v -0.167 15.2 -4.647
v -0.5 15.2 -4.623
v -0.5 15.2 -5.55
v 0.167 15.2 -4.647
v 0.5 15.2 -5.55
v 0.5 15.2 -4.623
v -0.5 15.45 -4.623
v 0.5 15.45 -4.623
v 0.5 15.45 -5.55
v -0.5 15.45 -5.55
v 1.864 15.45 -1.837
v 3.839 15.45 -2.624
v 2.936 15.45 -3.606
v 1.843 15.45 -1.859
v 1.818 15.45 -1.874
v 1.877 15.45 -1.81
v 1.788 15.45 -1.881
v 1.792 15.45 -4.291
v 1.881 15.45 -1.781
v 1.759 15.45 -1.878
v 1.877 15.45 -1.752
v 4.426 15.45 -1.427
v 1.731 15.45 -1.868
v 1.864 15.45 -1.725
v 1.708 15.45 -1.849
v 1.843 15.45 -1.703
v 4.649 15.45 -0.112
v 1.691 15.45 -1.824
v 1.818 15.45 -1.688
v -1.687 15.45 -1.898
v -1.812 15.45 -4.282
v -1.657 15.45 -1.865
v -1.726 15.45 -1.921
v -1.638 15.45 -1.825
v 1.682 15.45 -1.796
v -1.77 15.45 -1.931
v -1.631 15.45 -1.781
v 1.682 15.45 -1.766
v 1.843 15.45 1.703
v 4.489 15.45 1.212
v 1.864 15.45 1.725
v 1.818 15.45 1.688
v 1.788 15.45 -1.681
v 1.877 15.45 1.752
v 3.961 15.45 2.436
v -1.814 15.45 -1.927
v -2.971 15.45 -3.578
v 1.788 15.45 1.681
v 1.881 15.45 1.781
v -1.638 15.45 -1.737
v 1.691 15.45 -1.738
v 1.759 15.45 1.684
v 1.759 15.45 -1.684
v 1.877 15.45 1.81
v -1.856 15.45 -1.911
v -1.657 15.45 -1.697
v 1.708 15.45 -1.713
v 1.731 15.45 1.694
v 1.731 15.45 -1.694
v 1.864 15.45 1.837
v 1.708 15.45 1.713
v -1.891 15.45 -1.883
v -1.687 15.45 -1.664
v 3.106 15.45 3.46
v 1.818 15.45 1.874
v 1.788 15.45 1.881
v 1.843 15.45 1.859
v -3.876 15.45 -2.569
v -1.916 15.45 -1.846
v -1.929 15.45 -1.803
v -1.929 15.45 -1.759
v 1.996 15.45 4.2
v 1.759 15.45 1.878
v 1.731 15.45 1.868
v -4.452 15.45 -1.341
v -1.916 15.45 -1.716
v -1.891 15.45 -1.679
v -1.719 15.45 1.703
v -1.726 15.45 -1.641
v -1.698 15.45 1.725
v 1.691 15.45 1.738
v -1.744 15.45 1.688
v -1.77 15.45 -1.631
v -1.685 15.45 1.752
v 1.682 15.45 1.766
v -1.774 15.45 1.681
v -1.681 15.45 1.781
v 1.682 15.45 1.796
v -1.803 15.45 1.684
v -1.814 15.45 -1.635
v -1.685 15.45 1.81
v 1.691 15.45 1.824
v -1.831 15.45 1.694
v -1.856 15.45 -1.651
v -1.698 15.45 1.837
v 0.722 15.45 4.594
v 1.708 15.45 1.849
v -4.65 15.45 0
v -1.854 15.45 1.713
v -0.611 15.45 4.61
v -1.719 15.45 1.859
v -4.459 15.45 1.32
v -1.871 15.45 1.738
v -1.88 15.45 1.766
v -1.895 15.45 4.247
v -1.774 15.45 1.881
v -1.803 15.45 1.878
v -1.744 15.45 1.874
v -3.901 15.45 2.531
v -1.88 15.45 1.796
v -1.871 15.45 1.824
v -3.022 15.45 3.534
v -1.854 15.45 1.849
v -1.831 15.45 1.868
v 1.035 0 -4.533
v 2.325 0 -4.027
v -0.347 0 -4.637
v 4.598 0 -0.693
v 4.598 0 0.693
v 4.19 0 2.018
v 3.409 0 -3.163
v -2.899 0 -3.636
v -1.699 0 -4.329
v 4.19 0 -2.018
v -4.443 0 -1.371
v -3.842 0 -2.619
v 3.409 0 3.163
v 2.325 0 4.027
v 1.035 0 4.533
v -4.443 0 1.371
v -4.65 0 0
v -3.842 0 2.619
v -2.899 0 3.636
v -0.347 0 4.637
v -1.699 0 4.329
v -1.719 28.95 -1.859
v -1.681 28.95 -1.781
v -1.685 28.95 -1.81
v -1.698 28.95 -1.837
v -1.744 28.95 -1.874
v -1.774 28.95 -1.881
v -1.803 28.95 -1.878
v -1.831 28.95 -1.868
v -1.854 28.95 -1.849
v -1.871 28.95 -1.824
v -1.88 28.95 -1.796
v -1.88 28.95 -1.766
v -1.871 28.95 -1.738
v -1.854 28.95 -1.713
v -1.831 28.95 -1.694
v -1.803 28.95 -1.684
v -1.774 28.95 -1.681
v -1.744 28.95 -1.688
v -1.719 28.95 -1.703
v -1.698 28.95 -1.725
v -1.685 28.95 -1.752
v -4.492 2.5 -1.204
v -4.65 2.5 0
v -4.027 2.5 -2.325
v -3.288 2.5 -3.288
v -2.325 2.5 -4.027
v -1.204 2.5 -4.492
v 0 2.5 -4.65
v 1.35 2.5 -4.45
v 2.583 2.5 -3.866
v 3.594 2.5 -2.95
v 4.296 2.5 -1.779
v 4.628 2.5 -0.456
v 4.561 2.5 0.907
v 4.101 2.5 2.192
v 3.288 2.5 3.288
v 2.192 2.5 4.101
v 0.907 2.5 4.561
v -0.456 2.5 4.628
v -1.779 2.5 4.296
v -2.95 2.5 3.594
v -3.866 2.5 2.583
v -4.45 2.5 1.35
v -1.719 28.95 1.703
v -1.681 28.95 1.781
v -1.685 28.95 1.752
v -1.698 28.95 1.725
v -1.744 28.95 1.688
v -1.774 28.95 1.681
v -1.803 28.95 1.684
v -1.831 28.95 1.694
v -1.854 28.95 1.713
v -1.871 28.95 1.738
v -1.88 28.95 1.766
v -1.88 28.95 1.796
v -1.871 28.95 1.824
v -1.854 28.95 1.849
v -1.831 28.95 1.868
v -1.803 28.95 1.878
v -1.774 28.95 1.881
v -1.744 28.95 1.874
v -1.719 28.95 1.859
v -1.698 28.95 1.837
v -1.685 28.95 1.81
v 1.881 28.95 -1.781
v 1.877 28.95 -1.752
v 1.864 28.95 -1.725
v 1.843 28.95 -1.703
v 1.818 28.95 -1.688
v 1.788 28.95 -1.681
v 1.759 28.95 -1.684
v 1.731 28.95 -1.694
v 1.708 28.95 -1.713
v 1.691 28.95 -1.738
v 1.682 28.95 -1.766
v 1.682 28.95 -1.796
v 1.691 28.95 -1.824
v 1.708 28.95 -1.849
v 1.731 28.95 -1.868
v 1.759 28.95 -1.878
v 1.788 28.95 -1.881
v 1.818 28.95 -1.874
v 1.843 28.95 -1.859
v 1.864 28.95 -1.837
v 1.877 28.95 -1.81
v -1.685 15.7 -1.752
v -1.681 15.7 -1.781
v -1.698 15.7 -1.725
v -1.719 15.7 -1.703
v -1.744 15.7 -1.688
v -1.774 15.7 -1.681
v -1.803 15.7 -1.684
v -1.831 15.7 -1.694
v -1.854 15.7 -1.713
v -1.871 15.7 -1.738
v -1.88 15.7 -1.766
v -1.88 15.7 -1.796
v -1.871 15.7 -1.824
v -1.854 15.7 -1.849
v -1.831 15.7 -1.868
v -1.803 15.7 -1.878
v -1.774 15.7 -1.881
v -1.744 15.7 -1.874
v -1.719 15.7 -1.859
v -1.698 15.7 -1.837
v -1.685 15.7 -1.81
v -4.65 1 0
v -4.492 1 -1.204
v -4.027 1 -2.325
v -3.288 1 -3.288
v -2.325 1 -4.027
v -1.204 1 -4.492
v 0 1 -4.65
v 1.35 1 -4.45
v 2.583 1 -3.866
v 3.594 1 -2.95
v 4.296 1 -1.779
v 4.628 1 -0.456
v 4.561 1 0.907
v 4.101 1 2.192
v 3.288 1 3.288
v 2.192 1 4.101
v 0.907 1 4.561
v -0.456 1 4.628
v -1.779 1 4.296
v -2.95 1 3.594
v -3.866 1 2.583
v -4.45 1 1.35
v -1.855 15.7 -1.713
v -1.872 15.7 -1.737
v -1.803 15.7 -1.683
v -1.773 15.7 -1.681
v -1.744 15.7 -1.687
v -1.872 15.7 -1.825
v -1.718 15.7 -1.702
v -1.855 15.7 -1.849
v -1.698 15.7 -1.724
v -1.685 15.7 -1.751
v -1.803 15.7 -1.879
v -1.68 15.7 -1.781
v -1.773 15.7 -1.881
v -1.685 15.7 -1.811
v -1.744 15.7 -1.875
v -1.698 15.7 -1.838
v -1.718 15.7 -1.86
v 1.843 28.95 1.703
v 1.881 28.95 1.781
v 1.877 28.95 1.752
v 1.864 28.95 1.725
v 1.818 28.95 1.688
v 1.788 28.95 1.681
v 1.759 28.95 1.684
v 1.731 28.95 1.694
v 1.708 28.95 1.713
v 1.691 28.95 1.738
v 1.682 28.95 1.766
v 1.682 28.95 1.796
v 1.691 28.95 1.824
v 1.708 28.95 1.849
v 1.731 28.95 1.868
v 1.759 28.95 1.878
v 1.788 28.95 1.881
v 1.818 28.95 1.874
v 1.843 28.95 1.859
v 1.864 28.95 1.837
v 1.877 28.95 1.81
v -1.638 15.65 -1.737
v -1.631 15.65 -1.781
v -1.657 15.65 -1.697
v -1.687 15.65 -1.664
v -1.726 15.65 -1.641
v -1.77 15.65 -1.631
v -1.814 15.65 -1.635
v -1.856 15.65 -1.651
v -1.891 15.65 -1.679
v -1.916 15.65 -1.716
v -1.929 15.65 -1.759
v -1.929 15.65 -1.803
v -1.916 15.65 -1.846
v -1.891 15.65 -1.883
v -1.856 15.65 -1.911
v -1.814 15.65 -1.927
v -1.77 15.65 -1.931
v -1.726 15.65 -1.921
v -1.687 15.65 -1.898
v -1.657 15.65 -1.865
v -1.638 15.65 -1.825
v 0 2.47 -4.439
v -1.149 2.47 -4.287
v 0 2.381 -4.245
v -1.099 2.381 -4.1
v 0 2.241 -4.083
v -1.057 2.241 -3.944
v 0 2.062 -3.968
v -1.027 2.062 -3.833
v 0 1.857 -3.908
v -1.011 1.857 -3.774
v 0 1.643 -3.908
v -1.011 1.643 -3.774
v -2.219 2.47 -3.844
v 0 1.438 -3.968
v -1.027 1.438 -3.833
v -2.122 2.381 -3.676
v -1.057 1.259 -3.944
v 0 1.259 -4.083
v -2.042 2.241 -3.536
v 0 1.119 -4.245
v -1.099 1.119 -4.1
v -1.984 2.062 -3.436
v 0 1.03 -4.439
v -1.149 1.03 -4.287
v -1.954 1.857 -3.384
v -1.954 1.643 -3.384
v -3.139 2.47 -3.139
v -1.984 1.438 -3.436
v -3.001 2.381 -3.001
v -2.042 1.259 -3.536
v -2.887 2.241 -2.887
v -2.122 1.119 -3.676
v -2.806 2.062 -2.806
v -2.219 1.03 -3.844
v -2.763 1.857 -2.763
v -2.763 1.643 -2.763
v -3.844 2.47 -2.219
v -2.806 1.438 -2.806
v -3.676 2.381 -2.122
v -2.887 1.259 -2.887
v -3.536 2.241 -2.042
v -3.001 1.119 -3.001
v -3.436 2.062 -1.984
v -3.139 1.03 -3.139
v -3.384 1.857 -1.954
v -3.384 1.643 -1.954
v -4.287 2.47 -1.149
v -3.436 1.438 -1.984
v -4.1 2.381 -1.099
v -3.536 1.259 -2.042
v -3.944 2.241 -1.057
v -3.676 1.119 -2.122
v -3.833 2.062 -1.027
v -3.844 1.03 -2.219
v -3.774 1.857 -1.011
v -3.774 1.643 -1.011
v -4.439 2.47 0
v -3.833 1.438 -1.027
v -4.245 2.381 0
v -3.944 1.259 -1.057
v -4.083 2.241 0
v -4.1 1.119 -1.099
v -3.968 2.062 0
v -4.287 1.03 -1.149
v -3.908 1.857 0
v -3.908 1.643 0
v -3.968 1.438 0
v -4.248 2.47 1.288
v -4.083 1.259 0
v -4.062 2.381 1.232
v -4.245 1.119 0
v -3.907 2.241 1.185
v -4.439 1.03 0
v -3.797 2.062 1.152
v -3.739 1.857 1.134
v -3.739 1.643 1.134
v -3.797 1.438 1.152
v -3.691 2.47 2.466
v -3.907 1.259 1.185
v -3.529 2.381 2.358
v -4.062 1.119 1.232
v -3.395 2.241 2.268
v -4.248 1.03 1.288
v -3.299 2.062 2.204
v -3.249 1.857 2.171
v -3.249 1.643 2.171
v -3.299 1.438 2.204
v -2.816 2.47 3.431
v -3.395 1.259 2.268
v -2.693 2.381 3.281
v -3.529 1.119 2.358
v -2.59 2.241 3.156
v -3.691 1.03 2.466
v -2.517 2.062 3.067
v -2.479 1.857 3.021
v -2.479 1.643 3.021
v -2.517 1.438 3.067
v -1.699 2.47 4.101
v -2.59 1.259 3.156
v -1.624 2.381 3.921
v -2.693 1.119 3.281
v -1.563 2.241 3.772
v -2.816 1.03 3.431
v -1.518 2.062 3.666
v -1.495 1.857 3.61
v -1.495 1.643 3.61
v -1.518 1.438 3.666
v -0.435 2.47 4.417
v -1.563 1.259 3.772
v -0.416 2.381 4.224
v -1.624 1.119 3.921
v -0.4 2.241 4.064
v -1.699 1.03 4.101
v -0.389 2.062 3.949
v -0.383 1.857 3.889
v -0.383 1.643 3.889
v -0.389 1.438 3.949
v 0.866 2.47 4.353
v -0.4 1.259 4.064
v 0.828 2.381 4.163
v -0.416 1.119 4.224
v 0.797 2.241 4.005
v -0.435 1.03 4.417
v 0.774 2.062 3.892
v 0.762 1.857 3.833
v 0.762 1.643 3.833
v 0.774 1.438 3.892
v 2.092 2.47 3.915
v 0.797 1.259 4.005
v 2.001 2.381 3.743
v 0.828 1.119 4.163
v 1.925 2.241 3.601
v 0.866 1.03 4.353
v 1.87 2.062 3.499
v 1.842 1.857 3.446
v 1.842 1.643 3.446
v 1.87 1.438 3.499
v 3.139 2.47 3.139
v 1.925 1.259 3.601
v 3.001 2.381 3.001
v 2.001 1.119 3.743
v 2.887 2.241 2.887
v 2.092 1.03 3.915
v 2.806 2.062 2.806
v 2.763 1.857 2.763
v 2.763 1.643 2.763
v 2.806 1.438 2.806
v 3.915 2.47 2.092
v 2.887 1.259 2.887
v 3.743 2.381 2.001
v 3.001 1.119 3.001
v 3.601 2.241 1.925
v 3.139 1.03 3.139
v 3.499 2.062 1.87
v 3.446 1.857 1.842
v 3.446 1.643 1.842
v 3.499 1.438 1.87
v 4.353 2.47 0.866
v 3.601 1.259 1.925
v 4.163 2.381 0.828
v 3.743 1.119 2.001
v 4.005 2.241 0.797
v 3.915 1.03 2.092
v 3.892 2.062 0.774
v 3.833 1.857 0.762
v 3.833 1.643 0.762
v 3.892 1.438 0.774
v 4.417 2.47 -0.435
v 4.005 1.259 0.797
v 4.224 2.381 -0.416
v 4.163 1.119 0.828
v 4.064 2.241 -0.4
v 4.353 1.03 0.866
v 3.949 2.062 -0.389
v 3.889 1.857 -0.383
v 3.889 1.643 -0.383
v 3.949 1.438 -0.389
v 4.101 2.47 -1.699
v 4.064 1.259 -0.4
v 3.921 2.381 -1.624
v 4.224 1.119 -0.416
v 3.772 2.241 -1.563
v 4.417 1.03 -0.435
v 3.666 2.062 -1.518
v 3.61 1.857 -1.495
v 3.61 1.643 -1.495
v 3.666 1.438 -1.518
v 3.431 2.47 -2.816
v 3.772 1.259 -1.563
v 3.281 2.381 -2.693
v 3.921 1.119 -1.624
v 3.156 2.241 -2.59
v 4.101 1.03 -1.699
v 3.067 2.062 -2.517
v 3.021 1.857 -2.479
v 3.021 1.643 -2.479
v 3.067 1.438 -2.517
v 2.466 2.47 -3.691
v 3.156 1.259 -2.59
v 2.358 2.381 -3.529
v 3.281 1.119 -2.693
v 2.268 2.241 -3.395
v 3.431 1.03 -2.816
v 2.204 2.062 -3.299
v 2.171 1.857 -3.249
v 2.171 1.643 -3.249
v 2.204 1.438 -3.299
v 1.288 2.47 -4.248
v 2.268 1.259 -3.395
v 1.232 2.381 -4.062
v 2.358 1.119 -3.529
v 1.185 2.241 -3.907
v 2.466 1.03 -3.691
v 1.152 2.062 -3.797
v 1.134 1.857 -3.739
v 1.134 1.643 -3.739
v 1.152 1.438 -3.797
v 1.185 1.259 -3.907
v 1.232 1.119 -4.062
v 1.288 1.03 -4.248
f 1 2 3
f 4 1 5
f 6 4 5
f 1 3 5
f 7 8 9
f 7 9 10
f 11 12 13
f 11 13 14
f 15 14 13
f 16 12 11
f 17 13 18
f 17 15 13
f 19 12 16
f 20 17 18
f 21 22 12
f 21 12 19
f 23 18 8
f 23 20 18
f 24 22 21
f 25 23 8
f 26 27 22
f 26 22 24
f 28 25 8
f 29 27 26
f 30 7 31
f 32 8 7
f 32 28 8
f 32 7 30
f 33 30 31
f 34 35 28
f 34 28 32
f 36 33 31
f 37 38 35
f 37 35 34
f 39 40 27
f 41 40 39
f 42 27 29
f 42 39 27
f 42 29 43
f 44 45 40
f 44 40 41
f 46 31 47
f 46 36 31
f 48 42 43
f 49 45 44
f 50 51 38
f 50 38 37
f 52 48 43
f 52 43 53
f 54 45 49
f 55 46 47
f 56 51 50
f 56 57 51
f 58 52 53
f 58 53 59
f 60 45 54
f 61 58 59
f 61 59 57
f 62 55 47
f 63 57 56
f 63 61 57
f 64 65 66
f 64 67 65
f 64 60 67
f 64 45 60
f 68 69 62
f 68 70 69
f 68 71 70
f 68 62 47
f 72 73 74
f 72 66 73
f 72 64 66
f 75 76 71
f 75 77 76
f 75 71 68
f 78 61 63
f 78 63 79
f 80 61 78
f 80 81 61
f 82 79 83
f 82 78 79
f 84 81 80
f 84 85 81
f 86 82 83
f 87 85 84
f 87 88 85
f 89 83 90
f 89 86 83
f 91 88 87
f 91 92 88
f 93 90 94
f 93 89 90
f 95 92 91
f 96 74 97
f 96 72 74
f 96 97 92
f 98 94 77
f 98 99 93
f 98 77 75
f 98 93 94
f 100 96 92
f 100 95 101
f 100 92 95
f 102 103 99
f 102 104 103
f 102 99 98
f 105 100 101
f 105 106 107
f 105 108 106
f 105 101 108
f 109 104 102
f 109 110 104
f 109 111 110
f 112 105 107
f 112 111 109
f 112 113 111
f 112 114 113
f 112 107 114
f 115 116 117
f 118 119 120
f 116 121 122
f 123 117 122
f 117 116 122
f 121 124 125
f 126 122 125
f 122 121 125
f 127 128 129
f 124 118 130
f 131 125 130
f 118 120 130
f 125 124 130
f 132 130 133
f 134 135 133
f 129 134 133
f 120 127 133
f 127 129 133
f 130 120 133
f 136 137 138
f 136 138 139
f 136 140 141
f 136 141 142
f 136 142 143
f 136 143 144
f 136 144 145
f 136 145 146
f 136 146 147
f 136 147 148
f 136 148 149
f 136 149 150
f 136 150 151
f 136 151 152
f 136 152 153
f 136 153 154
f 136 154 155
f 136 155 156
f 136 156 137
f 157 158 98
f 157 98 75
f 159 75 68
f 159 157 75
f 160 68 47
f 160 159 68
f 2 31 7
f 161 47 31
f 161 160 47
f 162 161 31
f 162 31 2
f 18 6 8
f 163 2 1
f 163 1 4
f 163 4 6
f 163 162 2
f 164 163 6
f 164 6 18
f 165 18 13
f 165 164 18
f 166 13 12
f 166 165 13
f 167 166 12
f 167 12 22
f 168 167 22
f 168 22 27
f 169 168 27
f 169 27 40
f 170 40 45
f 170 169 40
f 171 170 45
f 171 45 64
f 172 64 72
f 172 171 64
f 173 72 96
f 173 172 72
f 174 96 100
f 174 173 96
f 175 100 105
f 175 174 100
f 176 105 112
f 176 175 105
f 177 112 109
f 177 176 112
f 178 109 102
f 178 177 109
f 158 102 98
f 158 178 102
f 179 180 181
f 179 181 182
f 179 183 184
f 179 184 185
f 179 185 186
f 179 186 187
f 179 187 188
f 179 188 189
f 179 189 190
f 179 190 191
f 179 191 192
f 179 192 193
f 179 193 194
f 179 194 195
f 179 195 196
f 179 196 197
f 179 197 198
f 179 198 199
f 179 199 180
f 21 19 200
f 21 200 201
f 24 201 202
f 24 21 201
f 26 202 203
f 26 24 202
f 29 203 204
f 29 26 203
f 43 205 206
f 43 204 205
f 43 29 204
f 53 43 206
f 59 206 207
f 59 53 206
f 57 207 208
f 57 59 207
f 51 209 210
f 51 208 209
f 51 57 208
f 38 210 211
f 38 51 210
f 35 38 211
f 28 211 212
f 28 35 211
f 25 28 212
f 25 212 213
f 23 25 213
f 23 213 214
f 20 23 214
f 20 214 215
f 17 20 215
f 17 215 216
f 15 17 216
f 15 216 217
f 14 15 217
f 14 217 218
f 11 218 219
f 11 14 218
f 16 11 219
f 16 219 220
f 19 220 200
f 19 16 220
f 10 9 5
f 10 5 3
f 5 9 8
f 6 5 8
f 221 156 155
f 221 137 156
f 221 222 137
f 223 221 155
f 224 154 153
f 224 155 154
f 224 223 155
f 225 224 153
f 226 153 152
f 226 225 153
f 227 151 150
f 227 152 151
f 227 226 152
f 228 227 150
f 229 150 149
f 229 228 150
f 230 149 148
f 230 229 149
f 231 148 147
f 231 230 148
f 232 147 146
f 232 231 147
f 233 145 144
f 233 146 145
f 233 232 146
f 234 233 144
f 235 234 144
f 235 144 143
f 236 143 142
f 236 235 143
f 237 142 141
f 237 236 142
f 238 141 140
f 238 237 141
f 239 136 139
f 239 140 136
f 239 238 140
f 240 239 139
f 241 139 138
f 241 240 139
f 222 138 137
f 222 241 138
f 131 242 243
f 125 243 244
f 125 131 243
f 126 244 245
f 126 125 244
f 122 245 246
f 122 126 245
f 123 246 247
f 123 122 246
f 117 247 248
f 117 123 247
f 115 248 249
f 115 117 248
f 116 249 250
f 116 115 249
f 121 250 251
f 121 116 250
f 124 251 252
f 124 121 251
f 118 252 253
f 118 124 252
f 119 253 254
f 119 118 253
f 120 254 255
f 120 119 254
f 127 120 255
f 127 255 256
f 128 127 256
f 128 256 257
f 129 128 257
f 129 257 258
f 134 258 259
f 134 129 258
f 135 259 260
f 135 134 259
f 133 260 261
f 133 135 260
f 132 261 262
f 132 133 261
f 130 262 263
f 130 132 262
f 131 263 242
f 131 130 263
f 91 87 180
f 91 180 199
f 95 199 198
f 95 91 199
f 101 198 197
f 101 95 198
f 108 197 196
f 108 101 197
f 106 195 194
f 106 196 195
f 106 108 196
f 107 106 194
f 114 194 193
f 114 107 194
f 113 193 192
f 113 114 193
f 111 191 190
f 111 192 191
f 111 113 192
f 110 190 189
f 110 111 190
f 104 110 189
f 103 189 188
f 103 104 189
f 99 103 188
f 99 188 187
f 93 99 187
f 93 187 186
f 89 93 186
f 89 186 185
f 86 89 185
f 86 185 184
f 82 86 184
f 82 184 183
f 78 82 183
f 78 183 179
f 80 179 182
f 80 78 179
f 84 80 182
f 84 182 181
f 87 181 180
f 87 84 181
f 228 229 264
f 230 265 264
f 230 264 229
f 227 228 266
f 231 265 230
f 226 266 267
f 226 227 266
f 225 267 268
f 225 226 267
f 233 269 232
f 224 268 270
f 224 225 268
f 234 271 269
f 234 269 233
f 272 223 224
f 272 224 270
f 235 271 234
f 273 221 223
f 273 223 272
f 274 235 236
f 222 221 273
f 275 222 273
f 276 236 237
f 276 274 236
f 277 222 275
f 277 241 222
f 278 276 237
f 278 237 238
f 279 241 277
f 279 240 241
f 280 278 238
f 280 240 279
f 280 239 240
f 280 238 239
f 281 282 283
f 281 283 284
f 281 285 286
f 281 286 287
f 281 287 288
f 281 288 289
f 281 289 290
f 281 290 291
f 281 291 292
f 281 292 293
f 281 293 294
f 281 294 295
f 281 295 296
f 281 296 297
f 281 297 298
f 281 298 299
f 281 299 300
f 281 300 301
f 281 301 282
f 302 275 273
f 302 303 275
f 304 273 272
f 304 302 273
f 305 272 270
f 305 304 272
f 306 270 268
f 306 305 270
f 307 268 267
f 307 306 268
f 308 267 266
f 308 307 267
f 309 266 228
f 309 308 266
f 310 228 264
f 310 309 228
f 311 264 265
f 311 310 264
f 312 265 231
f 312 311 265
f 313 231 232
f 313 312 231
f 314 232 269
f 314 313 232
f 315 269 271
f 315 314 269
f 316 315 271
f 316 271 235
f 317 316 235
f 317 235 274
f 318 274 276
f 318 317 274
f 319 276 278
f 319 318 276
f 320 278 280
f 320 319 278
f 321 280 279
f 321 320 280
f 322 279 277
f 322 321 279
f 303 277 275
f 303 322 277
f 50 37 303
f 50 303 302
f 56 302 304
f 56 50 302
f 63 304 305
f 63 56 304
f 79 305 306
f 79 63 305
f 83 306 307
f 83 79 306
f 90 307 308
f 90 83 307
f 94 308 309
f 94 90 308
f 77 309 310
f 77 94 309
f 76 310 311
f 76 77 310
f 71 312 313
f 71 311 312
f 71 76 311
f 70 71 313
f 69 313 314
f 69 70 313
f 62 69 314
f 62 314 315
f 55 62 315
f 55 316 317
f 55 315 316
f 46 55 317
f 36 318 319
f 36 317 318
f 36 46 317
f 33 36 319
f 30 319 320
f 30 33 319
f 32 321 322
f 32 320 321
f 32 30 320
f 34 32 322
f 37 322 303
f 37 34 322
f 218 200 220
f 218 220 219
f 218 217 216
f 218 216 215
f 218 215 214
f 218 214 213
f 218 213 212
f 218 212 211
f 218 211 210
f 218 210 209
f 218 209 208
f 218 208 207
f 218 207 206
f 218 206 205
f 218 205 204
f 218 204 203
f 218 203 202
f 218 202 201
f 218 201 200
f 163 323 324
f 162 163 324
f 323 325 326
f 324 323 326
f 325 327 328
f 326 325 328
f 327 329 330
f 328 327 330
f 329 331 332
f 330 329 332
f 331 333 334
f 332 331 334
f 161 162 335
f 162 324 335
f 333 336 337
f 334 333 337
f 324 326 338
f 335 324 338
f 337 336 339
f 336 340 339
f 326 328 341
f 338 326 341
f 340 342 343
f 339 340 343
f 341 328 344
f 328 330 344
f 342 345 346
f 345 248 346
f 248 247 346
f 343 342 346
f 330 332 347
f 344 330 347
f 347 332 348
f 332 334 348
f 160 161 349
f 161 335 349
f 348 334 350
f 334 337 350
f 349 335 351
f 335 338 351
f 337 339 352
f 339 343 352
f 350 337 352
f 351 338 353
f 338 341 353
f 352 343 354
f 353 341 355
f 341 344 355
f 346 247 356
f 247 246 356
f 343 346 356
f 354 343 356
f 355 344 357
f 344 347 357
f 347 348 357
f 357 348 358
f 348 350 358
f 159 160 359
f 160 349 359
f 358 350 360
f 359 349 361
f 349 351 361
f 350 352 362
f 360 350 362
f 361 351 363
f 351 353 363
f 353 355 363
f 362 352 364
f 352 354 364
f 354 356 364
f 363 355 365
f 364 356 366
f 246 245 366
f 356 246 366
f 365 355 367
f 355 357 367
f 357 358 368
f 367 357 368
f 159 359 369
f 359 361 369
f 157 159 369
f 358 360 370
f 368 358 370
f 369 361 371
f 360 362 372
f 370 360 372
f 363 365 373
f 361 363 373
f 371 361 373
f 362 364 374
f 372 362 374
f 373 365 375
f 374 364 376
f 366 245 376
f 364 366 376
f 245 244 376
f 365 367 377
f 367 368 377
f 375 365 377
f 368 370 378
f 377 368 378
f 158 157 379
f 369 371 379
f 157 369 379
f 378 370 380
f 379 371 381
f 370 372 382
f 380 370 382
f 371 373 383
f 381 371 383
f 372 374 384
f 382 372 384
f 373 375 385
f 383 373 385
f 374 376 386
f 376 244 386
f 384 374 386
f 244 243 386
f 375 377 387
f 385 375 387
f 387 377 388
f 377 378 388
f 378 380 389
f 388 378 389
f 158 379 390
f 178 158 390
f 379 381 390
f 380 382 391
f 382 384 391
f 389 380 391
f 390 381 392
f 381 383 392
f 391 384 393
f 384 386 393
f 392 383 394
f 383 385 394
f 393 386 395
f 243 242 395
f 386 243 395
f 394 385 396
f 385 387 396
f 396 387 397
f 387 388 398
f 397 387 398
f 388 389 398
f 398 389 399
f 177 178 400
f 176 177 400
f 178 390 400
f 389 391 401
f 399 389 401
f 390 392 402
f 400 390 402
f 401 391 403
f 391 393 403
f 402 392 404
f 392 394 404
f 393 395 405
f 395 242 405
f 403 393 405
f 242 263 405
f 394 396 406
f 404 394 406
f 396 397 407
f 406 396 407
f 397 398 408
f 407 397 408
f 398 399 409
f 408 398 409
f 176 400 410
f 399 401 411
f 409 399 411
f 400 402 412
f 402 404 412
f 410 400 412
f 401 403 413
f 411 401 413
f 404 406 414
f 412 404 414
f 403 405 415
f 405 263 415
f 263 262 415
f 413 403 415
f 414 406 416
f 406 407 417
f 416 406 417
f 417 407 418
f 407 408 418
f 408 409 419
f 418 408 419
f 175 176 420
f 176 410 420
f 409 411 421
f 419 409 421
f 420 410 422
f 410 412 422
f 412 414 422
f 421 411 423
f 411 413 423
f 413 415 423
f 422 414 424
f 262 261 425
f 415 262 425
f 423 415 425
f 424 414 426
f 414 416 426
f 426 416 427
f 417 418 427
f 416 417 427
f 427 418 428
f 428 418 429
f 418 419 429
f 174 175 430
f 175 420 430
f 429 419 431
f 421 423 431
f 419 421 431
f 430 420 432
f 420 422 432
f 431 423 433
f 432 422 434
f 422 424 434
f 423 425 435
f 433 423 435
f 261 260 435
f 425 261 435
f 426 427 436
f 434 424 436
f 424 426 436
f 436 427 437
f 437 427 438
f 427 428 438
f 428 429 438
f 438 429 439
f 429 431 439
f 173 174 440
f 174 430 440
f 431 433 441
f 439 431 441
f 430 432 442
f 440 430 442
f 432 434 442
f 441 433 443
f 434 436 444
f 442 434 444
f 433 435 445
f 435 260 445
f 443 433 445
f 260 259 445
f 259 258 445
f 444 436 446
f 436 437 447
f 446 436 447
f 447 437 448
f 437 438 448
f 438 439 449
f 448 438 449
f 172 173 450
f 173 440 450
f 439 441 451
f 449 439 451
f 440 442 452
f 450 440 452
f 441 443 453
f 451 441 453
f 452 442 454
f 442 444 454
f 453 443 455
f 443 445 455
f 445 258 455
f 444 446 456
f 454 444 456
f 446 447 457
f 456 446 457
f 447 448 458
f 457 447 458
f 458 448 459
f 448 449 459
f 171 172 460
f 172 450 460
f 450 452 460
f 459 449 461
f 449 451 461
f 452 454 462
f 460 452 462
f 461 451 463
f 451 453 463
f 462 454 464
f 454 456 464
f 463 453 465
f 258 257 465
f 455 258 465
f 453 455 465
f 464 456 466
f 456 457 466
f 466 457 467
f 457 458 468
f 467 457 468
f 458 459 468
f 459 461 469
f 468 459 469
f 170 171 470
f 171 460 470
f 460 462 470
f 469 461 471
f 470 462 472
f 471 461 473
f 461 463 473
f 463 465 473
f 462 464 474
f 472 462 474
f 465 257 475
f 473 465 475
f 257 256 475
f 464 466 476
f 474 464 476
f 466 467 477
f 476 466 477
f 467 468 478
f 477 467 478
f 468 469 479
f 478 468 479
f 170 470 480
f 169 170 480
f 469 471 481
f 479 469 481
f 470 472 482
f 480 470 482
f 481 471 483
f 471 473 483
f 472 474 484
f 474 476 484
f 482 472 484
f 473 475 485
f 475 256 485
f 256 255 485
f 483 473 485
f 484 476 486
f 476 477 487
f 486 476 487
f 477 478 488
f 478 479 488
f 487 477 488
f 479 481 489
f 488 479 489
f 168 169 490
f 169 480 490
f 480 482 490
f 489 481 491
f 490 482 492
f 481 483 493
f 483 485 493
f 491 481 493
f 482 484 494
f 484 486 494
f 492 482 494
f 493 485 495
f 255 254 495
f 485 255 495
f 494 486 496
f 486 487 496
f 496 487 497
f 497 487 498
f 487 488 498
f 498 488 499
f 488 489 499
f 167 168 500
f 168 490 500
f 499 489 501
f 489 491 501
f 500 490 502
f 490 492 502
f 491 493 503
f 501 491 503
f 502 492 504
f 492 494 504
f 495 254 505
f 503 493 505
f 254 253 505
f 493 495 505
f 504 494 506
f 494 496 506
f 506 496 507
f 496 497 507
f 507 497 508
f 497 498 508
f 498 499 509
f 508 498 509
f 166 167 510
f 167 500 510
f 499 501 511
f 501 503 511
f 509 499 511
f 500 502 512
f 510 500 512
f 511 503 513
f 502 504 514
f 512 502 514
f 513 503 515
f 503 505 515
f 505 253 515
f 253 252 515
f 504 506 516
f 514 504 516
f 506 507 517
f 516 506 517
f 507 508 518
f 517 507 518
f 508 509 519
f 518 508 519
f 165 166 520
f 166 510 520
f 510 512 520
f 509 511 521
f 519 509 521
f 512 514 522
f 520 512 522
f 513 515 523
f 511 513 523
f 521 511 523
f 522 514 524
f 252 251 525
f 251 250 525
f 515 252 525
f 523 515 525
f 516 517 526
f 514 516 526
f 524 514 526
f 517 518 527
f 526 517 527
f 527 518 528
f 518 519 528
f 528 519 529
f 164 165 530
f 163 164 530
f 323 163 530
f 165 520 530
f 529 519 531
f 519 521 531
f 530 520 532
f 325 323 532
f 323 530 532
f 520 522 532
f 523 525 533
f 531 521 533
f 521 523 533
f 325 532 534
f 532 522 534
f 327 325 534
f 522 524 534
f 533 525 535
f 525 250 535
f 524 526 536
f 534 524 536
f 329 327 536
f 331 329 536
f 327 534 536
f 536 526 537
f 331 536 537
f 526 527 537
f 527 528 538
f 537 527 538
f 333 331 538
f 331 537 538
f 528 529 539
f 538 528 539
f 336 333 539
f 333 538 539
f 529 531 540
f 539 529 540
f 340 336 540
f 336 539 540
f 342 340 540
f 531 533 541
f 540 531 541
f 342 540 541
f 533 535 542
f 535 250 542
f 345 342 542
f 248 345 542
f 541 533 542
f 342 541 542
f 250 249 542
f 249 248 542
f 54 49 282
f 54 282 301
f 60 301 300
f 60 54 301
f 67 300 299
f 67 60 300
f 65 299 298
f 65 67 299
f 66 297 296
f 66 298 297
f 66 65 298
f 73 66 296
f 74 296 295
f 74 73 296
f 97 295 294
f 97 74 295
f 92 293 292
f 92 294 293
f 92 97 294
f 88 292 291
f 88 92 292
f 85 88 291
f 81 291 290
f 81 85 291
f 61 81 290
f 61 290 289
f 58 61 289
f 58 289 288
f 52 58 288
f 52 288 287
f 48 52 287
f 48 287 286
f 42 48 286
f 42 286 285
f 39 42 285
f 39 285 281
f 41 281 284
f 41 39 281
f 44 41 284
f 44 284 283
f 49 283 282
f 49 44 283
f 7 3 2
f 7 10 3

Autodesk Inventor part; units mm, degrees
ref_plane "YZ Plane" through (0, 0, 0) normal (1, 0, 0) x (0, 1, 0)
ref_plane "XZ Plane" through (0, 0, 0) normal (0, 1, 0) x (-1, 0, 0)
ref_plane "XY Plane" through (0, 0, 0) normal (0, 0, 1) x (1, 0, 0)
sketch "Sketch1" plane through (0, 0, 0) normal (0, 1, 0) x (-1, 0, 0)
  circle A0 centre (0, 0) radius 4.65
  dimension "d0" = 9.3
extrude "Extrusion1" add sketch "Sketch1" along normal blind 15.45
sketch "Sketch2" plane through (0, 0, 0) normal (1, 0, 0) x (0, 1, 0)
  line L0 (15.45, -4.65) -> (15.45, 4.65) projected
  line L1 (0, -4.65) -> (0, 4.65) projected
  line L2 (0, -4.65) -> (15.45, -4.65) projected
  line L3 (0, 4.65) -> (15.45, 4.65) projected
  line L4 (0, -4.65) -> (1, -4.65)
  arc A0 (2.5, -4.65) -> (1, -4.65) centre (1.75, -4.65) ccw
  line L5 (2.5, -4.65) -> (1, -4.65)
  line L6 (-3.09, 0) -> (18.54, 0) projected
  point P0 (0, 0)
  dimension "d3" = 1
  dimension "d4" = 1.5
  dimension "d5" = 0.75
revolve "Revolution1" cut sketch "Sketch2" angle 360 about axis through (0, -10, 0) along (0, 1, 0) contours L2 A0
sketch "Sketch3" plane through (0, 15.45, 0) normal (0, 1, 0) x (1, 0, 0)
  circle A0 centre (0, 0) radius 4.65 projected
  line L0 (0, 0) -> (0, 4.65)
  line L1 (0, 5.55) -> (0.5, 5.55)
  line L2 (0, 5.55) -> (-0.5, 5.55)
  line L3 (-0.5, 5.55) -> (-0.5, 4.623)
  line L4 (0.5, 5.55) -> (0.5, 4.623)
  circle A1 centre (0, 0) radius 4.65 projected
  dimension "d7" = 0.9
  dimension "d8" = 0.5
  dimension "d9" = 0.5
extrude "Extrusion2" add sketch "Sketch3" against normal blind 0.25 contours A0 L3 L2 L1 L4
sketch "Sketch5" plane through (0, 15.45, 0) normal (0, 1, 0) x (1, 0, 0)
  arc A0 (-0.5, 4.623) -> (0.5, 4.623) centre (0, 0) ccw projected
  line L0 (0.5, 4.623) -> (0.5, 5.55) projected
  line L1 (0.5, 5.55) -> (-0.5, 5.55) projected
  line L2 (-0.5, 5.55) -> (-0.5, 4.623) projected
  line L3 (0, 0) -> (4.65, 0) construction
  line L4 (0, 0) -> (1.7961, 1.7961) construction
  circle A1 centre (1.781, 1.781) radius 0.1
  line L5 (1.781, 1.781) -> (1.781, 0) construction
  circle A2 centre (1.781, -1.781) radius 0.1
  line L6 (0, 0) -> (0, 5.55) construction
  circle A3 centre (-1.781, 1.781) radius 0.1
  circle A4 centre (-1.781, -1.781) radius 0.1
  circle A5 centre (-1.781, 1.781) radius 0.15
  dimension "d14" = 2.54
  dimension "d15" = 45
  dimension "d16" = 0.2
  dimension "d17" = 1.781
  dimension "d20" = 3.562
  dimension "d27" = 0.05
extrude "Extrusion3" add sketch "Sketch5" along normal blind 13.5 contours A1 | A2 | A3 | A4
extrude "Extrusion4" add sketch "Sketch5" along normal blind 0.25 contours A5
chamfer "Chamfer1" distance 0.05 angle 45 1 edges at (-1.931, 15.7, -1.781)
properties part number "IR Sensor"
